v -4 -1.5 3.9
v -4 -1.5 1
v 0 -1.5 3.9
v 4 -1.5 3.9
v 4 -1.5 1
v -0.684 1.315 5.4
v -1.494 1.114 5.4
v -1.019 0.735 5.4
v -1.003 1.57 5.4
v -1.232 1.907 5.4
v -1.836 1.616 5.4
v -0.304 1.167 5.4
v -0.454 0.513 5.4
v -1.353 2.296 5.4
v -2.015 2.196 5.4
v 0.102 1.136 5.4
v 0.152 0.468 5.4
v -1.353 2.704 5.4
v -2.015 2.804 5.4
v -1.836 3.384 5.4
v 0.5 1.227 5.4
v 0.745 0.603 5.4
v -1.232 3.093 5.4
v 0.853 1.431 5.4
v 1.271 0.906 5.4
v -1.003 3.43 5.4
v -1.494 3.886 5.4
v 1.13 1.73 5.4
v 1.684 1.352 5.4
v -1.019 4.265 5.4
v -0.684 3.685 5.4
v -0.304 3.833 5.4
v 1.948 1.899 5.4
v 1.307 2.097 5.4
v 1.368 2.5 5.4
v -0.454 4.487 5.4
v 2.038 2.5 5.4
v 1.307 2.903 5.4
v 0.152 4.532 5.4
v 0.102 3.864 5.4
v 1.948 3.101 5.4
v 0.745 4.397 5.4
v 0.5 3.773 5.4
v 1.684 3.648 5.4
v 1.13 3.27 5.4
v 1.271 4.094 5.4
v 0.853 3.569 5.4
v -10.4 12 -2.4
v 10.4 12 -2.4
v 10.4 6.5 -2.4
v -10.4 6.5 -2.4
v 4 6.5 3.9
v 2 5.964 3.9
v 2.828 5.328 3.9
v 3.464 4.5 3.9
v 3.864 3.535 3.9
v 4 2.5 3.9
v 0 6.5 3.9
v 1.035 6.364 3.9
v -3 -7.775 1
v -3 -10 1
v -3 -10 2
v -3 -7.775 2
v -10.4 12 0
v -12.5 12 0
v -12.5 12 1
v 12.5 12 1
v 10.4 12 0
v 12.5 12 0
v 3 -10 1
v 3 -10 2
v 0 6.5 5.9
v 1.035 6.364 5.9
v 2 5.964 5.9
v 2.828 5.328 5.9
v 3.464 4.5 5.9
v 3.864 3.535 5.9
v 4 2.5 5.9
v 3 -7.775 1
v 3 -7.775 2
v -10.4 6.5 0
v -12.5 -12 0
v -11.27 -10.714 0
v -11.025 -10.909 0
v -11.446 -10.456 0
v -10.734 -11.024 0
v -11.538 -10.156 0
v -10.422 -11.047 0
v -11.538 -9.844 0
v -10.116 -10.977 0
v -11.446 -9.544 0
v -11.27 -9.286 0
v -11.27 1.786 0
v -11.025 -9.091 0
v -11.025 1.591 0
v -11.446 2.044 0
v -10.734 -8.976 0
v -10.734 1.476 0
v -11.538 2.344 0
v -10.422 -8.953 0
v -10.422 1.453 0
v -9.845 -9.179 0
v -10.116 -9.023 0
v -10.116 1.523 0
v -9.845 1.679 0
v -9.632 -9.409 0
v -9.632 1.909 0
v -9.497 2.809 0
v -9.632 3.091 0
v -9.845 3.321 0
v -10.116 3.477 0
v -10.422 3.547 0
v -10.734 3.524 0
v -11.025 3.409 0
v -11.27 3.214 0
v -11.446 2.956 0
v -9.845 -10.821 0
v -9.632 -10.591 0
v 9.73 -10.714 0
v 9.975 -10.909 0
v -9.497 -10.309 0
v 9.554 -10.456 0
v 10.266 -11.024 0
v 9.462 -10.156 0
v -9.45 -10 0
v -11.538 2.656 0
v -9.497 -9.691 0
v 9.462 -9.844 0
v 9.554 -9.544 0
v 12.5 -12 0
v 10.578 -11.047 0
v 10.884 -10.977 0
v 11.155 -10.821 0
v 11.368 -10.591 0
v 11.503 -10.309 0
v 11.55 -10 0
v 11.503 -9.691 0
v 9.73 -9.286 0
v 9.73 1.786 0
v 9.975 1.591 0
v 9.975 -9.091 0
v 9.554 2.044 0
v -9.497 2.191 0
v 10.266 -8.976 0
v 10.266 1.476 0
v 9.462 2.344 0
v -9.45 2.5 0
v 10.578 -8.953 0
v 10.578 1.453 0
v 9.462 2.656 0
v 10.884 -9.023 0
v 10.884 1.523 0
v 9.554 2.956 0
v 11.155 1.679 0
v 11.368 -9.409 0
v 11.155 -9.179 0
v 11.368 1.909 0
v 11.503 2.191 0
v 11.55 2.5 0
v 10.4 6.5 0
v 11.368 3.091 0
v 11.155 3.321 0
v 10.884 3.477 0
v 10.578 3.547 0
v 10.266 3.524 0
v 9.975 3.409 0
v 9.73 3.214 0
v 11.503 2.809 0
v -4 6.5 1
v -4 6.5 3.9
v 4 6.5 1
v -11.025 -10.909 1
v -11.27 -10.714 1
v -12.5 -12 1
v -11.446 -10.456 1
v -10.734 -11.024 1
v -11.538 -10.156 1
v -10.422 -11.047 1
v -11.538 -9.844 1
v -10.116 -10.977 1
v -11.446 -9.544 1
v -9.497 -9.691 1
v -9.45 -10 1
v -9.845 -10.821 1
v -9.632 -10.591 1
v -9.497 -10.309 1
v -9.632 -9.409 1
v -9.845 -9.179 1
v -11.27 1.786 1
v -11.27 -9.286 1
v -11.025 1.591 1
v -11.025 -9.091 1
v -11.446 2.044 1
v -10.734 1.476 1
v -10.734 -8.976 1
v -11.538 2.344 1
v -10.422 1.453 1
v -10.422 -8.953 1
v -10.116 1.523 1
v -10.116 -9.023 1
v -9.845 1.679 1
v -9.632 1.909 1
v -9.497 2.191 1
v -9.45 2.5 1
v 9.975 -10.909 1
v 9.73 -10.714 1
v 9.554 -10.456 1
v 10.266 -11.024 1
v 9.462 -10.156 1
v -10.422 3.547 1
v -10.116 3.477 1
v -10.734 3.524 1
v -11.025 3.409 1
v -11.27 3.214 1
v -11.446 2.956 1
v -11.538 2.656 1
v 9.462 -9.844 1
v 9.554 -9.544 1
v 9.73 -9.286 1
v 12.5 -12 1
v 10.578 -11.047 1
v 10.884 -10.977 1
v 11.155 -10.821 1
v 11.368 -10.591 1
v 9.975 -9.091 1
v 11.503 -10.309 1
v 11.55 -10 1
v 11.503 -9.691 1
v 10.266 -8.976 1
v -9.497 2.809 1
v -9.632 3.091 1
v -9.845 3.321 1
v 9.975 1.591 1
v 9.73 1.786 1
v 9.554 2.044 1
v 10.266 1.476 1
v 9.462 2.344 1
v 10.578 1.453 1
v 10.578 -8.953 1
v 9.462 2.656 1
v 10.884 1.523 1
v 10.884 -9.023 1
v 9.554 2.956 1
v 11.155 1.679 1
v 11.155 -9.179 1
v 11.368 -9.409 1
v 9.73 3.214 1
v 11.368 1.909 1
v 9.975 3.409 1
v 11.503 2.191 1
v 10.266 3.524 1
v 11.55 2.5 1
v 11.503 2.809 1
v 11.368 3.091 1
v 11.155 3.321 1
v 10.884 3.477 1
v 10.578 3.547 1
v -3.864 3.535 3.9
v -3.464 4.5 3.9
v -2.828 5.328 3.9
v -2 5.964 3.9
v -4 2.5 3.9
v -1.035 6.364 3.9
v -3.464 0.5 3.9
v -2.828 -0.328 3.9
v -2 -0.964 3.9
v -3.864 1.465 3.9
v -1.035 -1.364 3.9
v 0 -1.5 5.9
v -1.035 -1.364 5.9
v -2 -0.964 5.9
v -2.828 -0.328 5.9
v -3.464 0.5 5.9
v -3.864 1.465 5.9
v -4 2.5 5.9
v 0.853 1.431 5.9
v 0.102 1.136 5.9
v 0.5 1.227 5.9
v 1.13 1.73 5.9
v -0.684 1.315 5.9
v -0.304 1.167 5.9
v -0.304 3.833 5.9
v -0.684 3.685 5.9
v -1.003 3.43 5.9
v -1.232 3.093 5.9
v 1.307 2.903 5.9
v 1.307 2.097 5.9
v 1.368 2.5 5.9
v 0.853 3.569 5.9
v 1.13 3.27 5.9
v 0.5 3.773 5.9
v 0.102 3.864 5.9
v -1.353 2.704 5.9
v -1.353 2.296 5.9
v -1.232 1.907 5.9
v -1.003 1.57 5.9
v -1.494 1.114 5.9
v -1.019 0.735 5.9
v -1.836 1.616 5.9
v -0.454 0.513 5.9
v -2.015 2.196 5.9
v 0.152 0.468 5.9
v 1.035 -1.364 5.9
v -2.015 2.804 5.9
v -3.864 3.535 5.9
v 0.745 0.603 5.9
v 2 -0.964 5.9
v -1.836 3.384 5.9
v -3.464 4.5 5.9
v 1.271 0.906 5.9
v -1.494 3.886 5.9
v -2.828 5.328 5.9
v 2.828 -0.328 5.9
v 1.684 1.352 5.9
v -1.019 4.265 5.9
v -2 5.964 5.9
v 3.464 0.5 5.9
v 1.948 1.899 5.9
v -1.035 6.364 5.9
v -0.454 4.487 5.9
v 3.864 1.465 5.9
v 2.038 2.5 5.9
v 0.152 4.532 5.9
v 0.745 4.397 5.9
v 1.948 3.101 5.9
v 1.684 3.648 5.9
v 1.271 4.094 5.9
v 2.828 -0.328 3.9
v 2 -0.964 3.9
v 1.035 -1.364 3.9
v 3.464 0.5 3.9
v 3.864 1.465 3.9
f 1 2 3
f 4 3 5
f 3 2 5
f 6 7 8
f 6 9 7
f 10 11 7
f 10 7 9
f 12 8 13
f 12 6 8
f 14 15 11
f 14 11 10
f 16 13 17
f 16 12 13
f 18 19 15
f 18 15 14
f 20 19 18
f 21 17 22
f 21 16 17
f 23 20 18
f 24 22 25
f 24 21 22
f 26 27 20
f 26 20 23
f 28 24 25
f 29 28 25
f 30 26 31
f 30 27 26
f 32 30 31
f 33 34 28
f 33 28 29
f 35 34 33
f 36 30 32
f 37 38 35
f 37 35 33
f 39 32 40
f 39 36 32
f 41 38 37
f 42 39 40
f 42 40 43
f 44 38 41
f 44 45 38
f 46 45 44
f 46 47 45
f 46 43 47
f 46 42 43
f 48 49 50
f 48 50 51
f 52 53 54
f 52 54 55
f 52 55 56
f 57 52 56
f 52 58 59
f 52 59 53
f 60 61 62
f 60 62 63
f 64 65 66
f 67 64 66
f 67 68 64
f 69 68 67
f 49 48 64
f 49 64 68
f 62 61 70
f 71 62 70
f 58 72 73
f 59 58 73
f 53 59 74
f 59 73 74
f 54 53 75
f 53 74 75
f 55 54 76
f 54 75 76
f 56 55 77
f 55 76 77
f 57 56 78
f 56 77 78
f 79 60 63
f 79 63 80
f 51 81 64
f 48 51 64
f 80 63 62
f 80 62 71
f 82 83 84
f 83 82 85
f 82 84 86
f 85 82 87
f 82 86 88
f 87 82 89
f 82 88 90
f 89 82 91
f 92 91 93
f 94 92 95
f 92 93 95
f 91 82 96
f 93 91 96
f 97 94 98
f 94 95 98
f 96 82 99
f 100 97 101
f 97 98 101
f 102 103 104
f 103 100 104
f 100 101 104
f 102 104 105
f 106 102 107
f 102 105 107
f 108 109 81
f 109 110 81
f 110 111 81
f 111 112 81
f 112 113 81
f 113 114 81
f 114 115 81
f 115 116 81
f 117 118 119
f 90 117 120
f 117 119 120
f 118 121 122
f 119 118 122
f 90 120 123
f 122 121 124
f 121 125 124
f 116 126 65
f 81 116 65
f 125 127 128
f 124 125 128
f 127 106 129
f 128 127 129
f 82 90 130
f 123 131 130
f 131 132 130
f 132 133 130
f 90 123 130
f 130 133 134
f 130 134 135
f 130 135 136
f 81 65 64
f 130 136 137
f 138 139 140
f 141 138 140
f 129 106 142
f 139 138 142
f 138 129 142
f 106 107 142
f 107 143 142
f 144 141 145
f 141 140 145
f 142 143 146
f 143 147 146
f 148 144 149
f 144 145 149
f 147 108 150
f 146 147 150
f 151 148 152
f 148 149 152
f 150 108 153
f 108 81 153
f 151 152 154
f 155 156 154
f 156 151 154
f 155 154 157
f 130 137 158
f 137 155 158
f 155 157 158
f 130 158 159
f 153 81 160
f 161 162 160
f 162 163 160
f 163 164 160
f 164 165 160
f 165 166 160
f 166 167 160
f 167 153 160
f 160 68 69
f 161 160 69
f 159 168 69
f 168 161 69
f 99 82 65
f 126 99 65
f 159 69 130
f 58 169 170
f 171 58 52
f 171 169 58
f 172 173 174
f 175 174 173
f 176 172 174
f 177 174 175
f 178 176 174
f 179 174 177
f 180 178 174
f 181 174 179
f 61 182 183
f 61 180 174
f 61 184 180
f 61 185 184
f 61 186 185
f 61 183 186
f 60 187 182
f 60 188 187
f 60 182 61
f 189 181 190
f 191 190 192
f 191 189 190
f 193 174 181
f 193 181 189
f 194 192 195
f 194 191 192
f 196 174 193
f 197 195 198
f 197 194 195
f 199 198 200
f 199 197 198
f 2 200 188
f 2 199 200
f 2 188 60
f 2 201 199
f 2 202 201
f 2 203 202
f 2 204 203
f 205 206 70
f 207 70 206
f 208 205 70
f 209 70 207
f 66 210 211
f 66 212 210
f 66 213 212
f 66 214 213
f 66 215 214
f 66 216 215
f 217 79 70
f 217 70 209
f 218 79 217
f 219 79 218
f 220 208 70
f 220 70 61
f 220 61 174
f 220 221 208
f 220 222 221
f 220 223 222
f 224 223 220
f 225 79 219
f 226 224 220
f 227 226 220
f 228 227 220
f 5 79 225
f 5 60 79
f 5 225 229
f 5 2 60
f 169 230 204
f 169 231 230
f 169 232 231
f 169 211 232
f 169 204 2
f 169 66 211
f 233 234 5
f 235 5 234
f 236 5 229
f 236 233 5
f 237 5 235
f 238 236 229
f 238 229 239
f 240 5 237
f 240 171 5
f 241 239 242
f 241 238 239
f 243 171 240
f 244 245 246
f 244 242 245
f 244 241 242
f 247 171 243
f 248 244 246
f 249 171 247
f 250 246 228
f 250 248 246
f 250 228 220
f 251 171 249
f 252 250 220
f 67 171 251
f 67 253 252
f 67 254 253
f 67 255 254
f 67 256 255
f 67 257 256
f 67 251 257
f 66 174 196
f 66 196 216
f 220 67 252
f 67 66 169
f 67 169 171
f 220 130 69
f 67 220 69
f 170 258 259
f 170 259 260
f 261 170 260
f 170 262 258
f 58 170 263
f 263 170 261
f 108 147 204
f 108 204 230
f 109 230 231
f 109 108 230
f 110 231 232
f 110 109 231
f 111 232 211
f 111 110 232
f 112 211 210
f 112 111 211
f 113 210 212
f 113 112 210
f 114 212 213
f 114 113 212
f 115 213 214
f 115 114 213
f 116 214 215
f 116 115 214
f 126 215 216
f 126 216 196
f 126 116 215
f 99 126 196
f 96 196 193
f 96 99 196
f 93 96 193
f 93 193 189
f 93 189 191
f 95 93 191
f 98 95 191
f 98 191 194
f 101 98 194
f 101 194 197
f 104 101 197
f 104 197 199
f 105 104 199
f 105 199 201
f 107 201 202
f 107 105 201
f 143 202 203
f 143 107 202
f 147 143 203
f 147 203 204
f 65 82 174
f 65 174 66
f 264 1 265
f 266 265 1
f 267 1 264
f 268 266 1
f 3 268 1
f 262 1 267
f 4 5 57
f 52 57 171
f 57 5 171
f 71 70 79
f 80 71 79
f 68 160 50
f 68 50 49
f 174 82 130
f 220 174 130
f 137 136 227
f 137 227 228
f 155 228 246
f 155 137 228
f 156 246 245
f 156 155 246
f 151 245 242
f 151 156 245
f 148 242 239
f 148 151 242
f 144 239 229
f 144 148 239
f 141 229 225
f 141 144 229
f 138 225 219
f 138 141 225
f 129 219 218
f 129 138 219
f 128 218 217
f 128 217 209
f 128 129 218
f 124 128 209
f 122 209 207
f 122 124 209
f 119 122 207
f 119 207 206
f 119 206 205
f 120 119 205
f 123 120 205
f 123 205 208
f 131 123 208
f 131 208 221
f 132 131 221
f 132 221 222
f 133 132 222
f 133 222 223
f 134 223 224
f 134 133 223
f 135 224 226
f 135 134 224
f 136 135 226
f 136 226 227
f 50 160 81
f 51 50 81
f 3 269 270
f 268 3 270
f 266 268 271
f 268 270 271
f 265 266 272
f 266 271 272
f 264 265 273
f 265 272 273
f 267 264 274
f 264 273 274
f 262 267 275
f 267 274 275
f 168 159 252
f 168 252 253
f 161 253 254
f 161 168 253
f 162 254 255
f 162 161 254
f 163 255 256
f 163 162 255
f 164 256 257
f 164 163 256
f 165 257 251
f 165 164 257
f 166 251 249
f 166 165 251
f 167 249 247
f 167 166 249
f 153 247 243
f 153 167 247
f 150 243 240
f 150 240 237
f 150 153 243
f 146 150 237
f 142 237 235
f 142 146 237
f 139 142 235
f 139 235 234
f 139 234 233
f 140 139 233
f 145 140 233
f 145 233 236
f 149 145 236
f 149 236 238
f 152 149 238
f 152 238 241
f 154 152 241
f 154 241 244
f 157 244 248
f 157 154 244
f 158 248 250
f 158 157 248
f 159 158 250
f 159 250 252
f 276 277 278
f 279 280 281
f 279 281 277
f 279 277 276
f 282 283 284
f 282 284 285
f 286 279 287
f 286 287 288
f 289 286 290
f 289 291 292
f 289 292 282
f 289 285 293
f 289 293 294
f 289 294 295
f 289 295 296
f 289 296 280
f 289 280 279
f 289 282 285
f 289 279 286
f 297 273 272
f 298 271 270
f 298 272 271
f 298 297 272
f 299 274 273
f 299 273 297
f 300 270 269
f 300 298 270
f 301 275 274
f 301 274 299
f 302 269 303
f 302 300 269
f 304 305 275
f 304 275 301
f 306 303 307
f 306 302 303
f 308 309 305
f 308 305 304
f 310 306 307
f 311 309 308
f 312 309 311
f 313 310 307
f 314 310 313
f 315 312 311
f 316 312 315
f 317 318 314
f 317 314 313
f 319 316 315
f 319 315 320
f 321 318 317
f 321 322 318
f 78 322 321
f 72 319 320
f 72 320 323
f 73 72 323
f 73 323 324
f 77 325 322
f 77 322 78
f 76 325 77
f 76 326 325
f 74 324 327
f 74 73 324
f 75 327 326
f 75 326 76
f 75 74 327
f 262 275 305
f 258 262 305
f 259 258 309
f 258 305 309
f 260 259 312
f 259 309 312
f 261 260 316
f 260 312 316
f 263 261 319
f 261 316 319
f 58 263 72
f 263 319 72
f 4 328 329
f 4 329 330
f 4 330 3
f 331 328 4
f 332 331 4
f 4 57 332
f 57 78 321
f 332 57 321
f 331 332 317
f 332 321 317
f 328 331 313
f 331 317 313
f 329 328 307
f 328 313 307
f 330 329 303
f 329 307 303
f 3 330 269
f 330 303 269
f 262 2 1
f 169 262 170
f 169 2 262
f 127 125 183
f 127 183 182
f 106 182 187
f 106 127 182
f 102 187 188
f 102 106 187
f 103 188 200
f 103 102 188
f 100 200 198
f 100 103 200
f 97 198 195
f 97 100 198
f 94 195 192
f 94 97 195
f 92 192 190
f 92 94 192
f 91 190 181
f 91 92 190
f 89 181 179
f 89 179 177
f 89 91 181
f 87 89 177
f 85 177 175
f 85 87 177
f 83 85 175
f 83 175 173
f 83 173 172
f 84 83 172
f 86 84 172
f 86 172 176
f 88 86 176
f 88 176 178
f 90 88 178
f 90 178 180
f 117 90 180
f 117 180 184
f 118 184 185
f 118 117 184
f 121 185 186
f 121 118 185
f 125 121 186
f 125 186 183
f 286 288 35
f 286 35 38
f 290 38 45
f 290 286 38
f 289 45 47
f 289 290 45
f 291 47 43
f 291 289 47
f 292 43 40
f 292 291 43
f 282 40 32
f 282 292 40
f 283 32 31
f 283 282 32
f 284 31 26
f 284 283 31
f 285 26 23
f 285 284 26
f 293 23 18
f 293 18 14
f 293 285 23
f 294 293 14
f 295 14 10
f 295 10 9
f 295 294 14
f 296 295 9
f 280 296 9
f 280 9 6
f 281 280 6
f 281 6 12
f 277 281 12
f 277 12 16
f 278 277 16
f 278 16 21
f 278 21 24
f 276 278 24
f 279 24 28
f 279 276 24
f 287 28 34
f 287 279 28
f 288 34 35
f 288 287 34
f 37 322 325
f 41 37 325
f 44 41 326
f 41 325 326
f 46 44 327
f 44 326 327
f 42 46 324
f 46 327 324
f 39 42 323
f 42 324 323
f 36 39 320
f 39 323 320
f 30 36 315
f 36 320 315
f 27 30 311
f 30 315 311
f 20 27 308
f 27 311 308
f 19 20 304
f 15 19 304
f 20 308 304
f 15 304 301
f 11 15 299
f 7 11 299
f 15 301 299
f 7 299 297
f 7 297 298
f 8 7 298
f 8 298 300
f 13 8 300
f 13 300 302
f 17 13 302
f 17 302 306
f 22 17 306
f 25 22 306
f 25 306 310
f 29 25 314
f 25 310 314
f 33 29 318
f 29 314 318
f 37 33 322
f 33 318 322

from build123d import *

# Parameters (mm, degrees)
SKETCH1_W           = 25
SKETCH1_H           = 24
SKETCH1_R           = 1.05
BOSS_EXTRUDE1_DEPTH = 1
SKETCH2_W           = 20.8
SKETCH2_H           = 5.5
BOSS_EXTRUDE2_DEPTH = 2.4
SKETCH3_W           = 8
SKETCH3_H           = 8
BOSS_EXTRUDE3_DEPTH = 4.9
CUT_EXTRUDE3_DEPTH  = 2
SKETCH7_R           = 2.038197989
SKETCH7_R_2         = 1.367783091
CUT_EXTRUDE4_DEPTH  = 0.5
SKETCH8_W           = 6
SKETCH8_H           = 2.224607268
BOSS_EXTRUDE4_DEPTH = 1


with BuildPart() as part:
    # Sketch1 → Boss-Extrude1 (new body)
    with BuildSketch(Plane.XY):
        Rectangle(SKETCH1_W, SKETCH1_H)
        with Locations((-10.5, 2.5)):
            Circle(SKETCH1_R, mode=Mode.SUBTRACT)
        with Locations((-10.5, -10)):
            Circle(SKETCH1_R, mode=Mode.SUBTRACT)
        with Locations((10.5, -10)):
            Circle(SKETCH1_R, mode=Mode.SUBTRACT)
        with Locations((10.5, 2.5)):
            Circle(SKETCH1_R, mode=Mode.SUBTRACT)
    extrude(amount=BOSS_EXTRUDE1_DEPTH)

    # Sketch2 → Boss-Extrude2 (add)
    with BuildSketch(Plane(origin=(0, 0, 0), x_dir=(-1, 0, 0), z_dir=(0, 0, -1))):
        with Locations((0, 9.25)):
            Rectangle(SKETCH2_W, SKETCH2_H)
    extrude(amount=BOSS_EXTRUDE2_DEPTH)

    # Sketch3 → Boss-Extrude3 (add)
    with BuildSketch(Plane.XY.offset(1)):
        with Locations((0, 2.5)):
            Rectangle(SKETCH3_W, SKETCH3_H)
    extrude(amount=BOSS_EXTRUDE3_DEPTH)

    # Sketch6 → Cut-Extrude3 (cut)
    with BuildSketch(Plane.XY.offset(5.9)):
        with BuildLine():
            Line((-4, 6.5), (-4, 2.499999997))
            ThreePointArc((-4, 2.499999997), (-2.828427126, 5.328427124), (0, 6.5))
            Line((0, 6.5), (-4, 6.5))
        make_face()
        with BuildLine():
            ThreePointArc((0, 6.5), (2.828427125, 5.328427125), (4, 2.5))
            Line((4, 2.5), (4, 6.5))
            Line((4, 6.5), (0, 6.5))
        make_face()
        with BuildLine():
            ThreePointArc((4, 2.5), (2.828427125, -0.328427125), (0, -1.5))
            Line((0, -1.5), (4, -1.5))
            Line((4, -1.5), (4, 2.5))
        make_face()
        with BuildLine():
            Line((-4, 2.499999997), (-4, -1.5))
            Line((-4, -1.5), (0, -1.5))
            ThreePointArc((0, -1.5), (-2.828427124, -0.328427126), (-4, 2.499999997))
        make_face()
    extrude(amount=-CUT_EXTRUDE3_DEPTH, mode=Mode.SUBTRACT)

    # Sketch7 → Cut-Extrude4 (cut)
    with BuildSketch(Plane.XY.offset(5.9)):
        with Locations((0, 2.5)):
            Circle(SKETCH7_R)
        with Locations((0, 2.5)):
            Circle(SKETCH7_R_2, mode=Mode.SUBTRACT)
    extrude(amount=-CUT_EXTRUDE4_DEPTH, mode=Mode.SUBTRACT)

    # Sketch8 → Boss-Extrude4 (add)
    with BuildSketch(Plane.XY.offset(1)):
        with Locations((0, -8.887696366)):
            Rectangle(SKETCH8_W, SKETCH8_H)
    extrude(amount=BOSS_EXTRUDE4_DEPTH)


solid = part.part
